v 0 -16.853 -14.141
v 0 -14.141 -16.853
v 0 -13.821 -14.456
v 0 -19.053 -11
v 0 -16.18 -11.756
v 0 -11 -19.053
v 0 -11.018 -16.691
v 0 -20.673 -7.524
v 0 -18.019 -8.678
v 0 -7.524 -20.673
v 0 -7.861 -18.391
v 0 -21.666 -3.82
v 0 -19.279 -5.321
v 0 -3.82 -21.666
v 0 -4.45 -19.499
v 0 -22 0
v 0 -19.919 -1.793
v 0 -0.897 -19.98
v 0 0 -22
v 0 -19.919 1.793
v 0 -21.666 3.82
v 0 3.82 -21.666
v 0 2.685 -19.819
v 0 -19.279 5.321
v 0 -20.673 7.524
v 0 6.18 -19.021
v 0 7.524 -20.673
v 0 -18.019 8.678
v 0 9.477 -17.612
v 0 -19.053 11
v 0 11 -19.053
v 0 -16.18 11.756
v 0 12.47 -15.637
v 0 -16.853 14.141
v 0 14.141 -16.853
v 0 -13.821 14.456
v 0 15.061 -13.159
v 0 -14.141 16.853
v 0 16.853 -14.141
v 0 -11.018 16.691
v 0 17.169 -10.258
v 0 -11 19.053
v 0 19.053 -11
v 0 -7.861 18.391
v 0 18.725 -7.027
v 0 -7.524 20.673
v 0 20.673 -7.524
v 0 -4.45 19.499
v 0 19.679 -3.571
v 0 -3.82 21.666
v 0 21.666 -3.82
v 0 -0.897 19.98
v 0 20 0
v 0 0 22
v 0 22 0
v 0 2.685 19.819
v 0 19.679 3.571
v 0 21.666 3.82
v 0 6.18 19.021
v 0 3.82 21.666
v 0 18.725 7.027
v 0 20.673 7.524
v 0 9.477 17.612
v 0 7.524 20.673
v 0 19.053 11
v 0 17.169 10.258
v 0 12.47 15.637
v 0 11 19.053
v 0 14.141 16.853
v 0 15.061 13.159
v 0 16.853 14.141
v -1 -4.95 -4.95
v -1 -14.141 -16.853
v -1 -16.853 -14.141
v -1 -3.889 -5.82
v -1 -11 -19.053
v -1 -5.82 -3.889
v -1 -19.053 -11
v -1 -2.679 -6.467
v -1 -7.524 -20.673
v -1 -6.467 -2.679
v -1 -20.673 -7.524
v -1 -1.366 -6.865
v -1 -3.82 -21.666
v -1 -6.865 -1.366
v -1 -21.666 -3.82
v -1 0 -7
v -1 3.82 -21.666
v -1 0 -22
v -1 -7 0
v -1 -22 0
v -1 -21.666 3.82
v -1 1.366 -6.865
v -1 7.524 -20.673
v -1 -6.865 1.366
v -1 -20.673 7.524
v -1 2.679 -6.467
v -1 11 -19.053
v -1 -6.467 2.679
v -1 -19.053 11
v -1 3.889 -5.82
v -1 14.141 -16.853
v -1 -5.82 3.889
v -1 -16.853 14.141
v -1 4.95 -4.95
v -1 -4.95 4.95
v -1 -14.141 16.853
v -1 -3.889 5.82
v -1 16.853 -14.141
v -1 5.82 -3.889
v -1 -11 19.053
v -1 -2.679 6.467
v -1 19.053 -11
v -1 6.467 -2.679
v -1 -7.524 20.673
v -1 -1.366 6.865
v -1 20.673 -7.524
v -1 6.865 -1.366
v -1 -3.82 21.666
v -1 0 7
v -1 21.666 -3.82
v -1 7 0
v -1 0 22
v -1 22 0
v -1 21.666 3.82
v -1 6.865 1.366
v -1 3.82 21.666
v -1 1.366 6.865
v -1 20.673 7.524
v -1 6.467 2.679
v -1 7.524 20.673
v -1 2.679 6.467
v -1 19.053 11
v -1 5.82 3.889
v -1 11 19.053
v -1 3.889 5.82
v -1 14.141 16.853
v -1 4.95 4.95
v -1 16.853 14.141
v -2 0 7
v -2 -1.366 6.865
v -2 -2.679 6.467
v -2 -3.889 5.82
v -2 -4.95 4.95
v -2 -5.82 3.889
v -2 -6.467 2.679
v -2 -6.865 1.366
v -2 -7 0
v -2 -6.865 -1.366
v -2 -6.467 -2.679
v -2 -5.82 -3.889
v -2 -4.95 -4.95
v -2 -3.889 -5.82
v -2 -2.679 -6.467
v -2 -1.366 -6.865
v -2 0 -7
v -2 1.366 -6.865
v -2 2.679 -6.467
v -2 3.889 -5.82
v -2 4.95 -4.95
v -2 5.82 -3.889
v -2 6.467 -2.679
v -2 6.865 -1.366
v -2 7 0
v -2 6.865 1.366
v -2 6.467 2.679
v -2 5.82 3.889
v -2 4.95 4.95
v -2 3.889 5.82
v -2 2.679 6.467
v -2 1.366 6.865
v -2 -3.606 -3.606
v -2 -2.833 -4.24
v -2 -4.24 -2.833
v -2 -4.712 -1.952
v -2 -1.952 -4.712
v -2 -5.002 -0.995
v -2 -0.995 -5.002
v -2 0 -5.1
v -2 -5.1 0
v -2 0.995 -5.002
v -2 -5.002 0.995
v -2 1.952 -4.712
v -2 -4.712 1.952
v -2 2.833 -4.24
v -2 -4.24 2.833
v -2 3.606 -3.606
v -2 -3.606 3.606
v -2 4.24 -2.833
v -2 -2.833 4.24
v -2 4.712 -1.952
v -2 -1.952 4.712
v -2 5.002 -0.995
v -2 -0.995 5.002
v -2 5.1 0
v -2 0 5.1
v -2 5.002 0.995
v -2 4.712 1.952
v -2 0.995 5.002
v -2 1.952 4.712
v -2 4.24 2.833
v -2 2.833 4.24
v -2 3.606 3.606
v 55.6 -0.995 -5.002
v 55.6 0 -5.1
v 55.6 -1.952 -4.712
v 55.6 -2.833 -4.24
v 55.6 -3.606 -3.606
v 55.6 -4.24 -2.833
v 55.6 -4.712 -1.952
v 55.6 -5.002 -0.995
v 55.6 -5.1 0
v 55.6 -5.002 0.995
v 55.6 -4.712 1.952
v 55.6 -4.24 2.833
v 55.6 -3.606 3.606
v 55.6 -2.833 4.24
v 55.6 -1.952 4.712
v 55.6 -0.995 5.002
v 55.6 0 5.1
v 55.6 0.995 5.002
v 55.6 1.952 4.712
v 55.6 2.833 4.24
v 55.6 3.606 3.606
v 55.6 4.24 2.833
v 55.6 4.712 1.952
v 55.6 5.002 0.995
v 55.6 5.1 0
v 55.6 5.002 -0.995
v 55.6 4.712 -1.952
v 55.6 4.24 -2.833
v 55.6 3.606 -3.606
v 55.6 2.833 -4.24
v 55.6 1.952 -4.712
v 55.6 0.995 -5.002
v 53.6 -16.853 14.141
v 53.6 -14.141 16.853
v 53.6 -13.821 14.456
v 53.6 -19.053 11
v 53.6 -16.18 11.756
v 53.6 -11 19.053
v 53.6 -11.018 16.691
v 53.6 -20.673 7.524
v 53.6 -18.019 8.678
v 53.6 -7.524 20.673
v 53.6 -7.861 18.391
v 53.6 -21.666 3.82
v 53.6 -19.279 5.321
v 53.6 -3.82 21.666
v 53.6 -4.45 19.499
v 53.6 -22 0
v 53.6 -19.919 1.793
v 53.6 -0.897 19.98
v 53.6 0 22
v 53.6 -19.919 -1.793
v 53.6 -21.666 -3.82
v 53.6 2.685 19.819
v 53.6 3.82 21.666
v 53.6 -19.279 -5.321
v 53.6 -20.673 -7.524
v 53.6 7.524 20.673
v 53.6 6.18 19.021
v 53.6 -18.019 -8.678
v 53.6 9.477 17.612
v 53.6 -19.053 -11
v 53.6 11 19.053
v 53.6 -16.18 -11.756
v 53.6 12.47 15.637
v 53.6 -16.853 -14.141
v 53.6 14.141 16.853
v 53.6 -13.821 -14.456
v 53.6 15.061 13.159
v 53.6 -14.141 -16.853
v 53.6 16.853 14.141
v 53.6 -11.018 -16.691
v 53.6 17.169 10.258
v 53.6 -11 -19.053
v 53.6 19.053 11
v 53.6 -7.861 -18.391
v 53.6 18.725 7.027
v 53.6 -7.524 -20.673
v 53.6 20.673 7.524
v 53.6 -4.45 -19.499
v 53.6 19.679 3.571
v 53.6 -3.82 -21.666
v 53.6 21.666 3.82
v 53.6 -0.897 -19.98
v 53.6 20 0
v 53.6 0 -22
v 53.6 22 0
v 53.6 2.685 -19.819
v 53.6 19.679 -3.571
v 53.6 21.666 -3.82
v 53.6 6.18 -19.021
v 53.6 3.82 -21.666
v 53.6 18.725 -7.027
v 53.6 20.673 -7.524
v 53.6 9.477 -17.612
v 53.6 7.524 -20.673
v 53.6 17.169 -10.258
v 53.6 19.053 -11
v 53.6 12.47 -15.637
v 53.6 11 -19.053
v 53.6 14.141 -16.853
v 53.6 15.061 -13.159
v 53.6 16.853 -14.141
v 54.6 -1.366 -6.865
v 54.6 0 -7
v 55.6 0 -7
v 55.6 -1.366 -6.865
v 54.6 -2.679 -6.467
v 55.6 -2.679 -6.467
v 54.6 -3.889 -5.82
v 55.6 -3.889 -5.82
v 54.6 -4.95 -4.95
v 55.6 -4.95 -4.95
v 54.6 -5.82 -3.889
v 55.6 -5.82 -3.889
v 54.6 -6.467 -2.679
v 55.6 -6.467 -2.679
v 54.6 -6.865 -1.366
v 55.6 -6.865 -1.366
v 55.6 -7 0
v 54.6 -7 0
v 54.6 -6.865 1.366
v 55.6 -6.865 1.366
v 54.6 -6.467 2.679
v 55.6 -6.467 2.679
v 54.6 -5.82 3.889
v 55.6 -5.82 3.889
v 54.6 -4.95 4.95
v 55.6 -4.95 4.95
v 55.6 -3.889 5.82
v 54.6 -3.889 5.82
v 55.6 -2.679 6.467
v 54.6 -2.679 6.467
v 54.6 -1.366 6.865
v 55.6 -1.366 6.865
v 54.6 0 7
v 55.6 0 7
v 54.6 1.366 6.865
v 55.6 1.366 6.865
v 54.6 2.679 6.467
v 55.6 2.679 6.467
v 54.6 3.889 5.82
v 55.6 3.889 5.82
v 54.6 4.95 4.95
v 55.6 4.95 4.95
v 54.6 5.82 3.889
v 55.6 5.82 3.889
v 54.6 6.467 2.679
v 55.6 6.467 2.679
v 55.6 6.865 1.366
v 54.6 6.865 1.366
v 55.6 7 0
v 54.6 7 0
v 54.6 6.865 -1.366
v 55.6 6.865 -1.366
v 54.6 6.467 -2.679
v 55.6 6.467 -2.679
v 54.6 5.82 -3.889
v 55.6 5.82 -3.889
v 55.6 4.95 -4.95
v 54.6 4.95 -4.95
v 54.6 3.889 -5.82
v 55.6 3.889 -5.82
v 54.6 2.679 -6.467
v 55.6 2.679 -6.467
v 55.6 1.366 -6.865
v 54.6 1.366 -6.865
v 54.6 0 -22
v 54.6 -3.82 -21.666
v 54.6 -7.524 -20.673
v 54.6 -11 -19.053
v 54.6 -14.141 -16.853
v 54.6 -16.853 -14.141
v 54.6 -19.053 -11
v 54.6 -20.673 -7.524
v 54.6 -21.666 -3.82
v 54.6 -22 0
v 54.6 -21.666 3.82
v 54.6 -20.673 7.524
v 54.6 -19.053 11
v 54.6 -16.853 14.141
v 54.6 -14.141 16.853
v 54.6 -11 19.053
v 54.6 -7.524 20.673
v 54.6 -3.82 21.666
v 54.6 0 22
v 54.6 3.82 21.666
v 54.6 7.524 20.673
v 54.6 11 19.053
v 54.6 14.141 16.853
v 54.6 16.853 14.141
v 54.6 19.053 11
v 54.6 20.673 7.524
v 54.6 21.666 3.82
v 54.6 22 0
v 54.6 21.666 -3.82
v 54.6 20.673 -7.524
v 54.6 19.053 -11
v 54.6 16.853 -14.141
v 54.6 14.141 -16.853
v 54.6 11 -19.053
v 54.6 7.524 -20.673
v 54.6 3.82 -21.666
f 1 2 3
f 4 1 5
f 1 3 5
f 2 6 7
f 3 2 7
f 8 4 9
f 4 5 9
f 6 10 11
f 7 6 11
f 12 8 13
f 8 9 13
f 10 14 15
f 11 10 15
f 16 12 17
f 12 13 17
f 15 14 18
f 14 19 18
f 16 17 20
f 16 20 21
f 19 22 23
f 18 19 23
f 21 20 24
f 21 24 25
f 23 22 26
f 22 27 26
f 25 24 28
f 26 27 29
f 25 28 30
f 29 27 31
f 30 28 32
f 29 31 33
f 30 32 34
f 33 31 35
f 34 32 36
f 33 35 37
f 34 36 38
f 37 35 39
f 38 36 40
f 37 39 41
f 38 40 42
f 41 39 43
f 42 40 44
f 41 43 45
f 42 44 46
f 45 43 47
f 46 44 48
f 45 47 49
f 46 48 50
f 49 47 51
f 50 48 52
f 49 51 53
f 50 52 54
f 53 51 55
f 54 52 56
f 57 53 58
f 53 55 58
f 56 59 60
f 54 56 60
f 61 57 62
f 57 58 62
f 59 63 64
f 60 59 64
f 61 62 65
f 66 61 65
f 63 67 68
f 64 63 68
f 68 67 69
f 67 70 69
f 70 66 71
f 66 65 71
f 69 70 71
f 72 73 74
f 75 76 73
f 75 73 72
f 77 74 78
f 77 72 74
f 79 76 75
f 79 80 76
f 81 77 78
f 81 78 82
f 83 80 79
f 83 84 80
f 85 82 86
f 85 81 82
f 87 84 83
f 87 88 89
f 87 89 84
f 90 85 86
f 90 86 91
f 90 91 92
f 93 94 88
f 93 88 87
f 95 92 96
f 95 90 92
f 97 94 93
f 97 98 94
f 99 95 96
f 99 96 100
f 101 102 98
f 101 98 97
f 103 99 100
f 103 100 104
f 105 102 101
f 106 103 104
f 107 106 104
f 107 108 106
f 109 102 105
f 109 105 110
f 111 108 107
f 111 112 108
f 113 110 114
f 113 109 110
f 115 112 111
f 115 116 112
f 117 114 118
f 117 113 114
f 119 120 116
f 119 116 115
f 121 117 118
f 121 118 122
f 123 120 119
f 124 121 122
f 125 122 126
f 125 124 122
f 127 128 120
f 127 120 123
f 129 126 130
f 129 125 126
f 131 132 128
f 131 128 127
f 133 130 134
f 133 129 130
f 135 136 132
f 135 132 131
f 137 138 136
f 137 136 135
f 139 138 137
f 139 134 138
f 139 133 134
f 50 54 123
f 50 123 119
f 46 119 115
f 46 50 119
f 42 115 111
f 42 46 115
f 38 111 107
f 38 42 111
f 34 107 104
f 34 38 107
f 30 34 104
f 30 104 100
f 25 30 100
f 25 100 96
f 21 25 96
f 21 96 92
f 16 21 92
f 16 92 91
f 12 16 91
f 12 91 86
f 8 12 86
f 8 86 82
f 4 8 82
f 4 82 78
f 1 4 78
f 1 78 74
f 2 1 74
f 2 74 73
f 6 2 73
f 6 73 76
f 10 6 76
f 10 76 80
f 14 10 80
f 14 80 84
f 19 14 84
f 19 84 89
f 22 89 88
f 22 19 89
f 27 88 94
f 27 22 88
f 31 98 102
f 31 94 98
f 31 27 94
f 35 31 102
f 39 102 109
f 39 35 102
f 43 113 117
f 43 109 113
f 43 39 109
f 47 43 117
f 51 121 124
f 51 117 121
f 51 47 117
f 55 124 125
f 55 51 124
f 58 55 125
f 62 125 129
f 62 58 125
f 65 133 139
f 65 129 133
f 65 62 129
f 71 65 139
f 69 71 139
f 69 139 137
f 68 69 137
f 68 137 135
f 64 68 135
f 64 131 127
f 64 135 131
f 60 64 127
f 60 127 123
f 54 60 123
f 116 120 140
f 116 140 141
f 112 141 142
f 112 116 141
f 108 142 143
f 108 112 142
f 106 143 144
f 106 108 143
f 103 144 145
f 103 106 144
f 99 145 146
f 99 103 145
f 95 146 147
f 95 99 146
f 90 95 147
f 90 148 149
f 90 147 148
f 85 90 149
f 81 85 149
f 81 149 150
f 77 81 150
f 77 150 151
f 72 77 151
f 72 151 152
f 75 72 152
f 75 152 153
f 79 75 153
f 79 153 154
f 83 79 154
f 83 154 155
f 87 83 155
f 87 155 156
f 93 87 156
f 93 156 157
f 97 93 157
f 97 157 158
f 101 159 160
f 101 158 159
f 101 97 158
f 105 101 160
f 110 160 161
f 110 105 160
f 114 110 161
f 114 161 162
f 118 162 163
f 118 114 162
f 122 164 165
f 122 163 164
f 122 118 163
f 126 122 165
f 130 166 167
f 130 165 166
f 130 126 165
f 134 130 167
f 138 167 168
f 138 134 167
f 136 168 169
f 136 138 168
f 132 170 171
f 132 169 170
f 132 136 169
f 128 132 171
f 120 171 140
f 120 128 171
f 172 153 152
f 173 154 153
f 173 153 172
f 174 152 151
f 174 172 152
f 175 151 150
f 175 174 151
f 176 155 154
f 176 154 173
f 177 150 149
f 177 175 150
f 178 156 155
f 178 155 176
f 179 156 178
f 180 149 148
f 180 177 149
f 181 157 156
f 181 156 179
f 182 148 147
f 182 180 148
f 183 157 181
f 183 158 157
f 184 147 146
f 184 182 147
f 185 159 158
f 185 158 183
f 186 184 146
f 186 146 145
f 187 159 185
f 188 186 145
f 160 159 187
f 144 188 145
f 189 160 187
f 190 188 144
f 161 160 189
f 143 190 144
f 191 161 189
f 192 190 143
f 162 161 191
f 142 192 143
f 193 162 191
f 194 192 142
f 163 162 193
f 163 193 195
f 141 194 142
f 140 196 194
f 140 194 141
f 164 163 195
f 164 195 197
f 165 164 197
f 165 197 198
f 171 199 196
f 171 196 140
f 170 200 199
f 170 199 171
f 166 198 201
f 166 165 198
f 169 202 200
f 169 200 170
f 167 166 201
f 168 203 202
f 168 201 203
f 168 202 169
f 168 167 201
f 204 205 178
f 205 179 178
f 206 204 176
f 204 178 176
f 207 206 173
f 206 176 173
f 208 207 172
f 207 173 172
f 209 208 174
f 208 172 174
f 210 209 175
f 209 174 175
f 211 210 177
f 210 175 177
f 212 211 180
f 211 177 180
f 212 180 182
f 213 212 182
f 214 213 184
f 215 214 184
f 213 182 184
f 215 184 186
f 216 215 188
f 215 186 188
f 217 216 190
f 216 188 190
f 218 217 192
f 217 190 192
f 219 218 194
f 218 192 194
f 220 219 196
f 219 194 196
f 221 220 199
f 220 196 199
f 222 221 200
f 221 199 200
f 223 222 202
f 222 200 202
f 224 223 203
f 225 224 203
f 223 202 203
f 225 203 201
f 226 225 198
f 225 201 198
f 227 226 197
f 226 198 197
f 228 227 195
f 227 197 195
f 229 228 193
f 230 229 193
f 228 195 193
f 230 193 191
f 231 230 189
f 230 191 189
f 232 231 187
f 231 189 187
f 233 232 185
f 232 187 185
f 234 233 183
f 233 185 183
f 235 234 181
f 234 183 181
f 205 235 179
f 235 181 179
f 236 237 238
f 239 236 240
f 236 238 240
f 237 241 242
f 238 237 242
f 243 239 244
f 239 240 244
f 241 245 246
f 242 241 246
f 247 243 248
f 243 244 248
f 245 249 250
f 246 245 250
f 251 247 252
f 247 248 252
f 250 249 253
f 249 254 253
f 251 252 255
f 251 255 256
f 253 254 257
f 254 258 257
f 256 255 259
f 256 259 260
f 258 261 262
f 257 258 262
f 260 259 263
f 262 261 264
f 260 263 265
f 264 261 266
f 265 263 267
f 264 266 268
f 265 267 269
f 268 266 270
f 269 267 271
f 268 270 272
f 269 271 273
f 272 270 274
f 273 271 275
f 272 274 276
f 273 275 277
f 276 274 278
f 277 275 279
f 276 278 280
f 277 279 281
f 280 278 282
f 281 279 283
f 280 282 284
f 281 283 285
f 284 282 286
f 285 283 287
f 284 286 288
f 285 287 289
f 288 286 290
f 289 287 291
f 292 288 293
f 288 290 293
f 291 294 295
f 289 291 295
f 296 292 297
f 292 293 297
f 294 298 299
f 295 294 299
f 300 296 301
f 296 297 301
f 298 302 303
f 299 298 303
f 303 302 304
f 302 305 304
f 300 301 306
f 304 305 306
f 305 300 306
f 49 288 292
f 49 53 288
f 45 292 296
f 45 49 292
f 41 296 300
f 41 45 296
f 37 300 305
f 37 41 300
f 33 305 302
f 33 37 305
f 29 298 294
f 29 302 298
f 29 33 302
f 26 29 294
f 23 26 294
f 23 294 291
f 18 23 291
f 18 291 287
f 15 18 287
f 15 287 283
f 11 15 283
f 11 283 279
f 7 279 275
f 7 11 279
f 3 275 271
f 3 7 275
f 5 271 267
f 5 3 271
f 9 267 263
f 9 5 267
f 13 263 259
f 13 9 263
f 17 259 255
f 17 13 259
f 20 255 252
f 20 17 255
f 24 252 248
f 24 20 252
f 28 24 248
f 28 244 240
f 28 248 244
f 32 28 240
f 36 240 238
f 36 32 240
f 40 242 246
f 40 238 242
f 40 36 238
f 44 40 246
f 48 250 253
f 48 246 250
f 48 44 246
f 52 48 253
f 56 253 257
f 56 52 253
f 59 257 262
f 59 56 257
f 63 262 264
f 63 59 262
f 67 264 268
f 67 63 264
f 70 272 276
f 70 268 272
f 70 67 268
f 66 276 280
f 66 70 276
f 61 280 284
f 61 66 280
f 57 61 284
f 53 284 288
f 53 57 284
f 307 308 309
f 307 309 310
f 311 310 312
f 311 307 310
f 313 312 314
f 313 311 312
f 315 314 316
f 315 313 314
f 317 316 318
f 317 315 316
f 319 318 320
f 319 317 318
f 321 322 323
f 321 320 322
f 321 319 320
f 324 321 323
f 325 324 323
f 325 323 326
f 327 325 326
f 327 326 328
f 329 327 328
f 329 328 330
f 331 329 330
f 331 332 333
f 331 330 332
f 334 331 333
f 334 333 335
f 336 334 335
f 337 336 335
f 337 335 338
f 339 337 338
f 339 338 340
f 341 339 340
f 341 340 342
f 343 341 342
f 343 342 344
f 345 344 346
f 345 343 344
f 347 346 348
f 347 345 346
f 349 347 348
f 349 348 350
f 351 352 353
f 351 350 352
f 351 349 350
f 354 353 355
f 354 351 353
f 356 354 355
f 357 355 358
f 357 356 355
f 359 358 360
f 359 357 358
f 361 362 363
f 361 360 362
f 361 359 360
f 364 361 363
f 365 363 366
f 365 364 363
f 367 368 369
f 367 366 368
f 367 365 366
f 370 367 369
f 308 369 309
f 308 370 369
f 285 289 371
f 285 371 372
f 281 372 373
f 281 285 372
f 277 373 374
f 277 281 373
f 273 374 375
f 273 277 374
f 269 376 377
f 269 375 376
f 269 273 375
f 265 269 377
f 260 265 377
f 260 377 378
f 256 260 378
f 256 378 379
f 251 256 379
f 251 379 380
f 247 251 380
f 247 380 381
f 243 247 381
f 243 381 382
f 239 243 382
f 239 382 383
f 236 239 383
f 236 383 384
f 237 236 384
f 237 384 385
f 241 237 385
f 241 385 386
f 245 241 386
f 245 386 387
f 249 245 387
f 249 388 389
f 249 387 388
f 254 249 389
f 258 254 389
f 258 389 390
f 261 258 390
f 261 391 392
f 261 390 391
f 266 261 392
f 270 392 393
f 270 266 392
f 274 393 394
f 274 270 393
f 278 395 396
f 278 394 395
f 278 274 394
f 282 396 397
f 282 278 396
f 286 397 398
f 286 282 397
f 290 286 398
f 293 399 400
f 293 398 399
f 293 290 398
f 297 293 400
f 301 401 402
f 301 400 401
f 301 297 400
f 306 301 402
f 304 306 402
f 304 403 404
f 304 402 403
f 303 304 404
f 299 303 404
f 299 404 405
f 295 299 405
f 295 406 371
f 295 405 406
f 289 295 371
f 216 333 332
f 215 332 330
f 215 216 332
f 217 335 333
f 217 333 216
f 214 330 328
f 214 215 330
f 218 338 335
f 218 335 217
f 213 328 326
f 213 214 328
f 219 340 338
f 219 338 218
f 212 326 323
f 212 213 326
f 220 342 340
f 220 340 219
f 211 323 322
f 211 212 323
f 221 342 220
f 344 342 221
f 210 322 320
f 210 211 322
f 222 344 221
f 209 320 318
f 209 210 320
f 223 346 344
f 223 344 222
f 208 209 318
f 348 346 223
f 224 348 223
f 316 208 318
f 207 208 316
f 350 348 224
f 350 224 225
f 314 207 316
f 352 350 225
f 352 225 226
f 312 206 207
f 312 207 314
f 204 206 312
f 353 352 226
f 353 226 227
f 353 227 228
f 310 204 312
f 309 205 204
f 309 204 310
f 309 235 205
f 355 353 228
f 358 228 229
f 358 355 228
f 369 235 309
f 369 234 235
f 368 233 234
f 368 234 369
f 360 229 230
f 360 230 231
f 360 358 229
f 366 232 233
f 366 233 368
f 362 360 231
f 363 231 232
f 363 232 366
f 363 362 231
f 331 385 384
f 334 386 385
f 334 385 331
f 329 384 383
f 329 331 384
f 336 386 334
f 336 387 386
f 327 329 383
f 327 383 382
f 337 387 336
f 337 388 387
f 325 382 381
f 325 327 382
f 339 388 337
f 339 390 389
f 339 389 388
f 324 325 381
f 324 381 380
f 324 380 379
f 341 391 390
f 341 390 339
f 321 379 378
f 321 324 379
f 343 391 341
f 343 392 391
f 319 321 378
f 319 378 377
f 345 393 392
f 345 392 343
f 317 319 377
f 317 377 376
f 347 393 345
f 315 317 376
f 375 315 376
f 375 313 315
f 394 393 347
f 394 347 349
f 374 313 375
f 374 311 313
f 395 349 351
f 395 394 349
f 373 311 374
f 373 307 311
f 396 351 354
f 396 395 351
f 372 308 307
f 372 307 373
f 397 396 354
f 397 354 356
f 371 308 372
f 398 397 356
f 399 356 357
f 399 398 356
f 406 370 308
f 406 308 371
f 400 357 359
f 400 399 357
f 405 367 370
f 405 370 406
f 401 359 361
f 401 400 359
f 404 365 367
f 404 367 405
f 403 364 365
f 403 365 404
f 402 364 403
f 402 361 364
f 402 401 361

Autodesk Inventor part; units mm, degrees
ref_plane "YZ Plane" through (0, 0, 0) normal (1, 0, 0) x (0, 1, 0)
ref_plane "XZ Plane" through (0, 0, 0) normal (0, 1, 0) x (-1, 0, 0)
ref_plane "XY Plane" through (0, 0, 0) normal (0, 0, 1) x (1, 0, 0)
sketch "スケッチ1" plane through (0, 0, 0) normal (1, 0, 0) x (0, 1, 0)
  circle A0 centre (0, 0) radius 20
  dimension "d0" = 40
extrude "押し出し1" add sketch "スケッチ1" along normal blind 53.6
sketch "スケッチ2" plane through (53.6, 0, 0) normal (1, 0, 0) x (0, 0, -1)
  circle A0 centre (0, 0) radius 22
  dimension "d3" = 44
extrude "押し出し2" add sketch "スケッチ2" along normal blind 1
sketch "スケッチ3" plane through (54.6, 0, 0) normal (1, 0, 0) x (0, 0, -1)
  circle A0 centre (0, 0) radius 7
  dimension "d6" = 14
extrude "押し出し3" add sketch "スケッチ3" along normal blind 1
sketch "スケッチ4" plane through (0, 0, 0) normal (-1, 0, 0) x (0, 0, 1)
  circle A0 centre (0, 0) radius 22
  dimension "d9" = 44
extrude "押し出し4" add sketch "スケッチ4" along normal blind 1
sketch "スケッチ5" plane through (-1, 0, 0) normal (-1, 0, 0) x (0, 0, 1)
  circle A0 centre (0, 0) radius 7
  dimension "d12" = 14
extrude "押し出し5" add sketch "スケッチ5" along normal blind 1
sketch "スケッチ6" plane through (55.6, 0, 0) normal (1, 0, 0) x (0, 0, -1)
  circle A0 centre (0, 0) radius 7 projected
hole "穴1" at (55.6, 0, 0) direction (-1, 0, 0) diameter 10.2 end through all
properties part number "CLS_typeC_31.4N"
